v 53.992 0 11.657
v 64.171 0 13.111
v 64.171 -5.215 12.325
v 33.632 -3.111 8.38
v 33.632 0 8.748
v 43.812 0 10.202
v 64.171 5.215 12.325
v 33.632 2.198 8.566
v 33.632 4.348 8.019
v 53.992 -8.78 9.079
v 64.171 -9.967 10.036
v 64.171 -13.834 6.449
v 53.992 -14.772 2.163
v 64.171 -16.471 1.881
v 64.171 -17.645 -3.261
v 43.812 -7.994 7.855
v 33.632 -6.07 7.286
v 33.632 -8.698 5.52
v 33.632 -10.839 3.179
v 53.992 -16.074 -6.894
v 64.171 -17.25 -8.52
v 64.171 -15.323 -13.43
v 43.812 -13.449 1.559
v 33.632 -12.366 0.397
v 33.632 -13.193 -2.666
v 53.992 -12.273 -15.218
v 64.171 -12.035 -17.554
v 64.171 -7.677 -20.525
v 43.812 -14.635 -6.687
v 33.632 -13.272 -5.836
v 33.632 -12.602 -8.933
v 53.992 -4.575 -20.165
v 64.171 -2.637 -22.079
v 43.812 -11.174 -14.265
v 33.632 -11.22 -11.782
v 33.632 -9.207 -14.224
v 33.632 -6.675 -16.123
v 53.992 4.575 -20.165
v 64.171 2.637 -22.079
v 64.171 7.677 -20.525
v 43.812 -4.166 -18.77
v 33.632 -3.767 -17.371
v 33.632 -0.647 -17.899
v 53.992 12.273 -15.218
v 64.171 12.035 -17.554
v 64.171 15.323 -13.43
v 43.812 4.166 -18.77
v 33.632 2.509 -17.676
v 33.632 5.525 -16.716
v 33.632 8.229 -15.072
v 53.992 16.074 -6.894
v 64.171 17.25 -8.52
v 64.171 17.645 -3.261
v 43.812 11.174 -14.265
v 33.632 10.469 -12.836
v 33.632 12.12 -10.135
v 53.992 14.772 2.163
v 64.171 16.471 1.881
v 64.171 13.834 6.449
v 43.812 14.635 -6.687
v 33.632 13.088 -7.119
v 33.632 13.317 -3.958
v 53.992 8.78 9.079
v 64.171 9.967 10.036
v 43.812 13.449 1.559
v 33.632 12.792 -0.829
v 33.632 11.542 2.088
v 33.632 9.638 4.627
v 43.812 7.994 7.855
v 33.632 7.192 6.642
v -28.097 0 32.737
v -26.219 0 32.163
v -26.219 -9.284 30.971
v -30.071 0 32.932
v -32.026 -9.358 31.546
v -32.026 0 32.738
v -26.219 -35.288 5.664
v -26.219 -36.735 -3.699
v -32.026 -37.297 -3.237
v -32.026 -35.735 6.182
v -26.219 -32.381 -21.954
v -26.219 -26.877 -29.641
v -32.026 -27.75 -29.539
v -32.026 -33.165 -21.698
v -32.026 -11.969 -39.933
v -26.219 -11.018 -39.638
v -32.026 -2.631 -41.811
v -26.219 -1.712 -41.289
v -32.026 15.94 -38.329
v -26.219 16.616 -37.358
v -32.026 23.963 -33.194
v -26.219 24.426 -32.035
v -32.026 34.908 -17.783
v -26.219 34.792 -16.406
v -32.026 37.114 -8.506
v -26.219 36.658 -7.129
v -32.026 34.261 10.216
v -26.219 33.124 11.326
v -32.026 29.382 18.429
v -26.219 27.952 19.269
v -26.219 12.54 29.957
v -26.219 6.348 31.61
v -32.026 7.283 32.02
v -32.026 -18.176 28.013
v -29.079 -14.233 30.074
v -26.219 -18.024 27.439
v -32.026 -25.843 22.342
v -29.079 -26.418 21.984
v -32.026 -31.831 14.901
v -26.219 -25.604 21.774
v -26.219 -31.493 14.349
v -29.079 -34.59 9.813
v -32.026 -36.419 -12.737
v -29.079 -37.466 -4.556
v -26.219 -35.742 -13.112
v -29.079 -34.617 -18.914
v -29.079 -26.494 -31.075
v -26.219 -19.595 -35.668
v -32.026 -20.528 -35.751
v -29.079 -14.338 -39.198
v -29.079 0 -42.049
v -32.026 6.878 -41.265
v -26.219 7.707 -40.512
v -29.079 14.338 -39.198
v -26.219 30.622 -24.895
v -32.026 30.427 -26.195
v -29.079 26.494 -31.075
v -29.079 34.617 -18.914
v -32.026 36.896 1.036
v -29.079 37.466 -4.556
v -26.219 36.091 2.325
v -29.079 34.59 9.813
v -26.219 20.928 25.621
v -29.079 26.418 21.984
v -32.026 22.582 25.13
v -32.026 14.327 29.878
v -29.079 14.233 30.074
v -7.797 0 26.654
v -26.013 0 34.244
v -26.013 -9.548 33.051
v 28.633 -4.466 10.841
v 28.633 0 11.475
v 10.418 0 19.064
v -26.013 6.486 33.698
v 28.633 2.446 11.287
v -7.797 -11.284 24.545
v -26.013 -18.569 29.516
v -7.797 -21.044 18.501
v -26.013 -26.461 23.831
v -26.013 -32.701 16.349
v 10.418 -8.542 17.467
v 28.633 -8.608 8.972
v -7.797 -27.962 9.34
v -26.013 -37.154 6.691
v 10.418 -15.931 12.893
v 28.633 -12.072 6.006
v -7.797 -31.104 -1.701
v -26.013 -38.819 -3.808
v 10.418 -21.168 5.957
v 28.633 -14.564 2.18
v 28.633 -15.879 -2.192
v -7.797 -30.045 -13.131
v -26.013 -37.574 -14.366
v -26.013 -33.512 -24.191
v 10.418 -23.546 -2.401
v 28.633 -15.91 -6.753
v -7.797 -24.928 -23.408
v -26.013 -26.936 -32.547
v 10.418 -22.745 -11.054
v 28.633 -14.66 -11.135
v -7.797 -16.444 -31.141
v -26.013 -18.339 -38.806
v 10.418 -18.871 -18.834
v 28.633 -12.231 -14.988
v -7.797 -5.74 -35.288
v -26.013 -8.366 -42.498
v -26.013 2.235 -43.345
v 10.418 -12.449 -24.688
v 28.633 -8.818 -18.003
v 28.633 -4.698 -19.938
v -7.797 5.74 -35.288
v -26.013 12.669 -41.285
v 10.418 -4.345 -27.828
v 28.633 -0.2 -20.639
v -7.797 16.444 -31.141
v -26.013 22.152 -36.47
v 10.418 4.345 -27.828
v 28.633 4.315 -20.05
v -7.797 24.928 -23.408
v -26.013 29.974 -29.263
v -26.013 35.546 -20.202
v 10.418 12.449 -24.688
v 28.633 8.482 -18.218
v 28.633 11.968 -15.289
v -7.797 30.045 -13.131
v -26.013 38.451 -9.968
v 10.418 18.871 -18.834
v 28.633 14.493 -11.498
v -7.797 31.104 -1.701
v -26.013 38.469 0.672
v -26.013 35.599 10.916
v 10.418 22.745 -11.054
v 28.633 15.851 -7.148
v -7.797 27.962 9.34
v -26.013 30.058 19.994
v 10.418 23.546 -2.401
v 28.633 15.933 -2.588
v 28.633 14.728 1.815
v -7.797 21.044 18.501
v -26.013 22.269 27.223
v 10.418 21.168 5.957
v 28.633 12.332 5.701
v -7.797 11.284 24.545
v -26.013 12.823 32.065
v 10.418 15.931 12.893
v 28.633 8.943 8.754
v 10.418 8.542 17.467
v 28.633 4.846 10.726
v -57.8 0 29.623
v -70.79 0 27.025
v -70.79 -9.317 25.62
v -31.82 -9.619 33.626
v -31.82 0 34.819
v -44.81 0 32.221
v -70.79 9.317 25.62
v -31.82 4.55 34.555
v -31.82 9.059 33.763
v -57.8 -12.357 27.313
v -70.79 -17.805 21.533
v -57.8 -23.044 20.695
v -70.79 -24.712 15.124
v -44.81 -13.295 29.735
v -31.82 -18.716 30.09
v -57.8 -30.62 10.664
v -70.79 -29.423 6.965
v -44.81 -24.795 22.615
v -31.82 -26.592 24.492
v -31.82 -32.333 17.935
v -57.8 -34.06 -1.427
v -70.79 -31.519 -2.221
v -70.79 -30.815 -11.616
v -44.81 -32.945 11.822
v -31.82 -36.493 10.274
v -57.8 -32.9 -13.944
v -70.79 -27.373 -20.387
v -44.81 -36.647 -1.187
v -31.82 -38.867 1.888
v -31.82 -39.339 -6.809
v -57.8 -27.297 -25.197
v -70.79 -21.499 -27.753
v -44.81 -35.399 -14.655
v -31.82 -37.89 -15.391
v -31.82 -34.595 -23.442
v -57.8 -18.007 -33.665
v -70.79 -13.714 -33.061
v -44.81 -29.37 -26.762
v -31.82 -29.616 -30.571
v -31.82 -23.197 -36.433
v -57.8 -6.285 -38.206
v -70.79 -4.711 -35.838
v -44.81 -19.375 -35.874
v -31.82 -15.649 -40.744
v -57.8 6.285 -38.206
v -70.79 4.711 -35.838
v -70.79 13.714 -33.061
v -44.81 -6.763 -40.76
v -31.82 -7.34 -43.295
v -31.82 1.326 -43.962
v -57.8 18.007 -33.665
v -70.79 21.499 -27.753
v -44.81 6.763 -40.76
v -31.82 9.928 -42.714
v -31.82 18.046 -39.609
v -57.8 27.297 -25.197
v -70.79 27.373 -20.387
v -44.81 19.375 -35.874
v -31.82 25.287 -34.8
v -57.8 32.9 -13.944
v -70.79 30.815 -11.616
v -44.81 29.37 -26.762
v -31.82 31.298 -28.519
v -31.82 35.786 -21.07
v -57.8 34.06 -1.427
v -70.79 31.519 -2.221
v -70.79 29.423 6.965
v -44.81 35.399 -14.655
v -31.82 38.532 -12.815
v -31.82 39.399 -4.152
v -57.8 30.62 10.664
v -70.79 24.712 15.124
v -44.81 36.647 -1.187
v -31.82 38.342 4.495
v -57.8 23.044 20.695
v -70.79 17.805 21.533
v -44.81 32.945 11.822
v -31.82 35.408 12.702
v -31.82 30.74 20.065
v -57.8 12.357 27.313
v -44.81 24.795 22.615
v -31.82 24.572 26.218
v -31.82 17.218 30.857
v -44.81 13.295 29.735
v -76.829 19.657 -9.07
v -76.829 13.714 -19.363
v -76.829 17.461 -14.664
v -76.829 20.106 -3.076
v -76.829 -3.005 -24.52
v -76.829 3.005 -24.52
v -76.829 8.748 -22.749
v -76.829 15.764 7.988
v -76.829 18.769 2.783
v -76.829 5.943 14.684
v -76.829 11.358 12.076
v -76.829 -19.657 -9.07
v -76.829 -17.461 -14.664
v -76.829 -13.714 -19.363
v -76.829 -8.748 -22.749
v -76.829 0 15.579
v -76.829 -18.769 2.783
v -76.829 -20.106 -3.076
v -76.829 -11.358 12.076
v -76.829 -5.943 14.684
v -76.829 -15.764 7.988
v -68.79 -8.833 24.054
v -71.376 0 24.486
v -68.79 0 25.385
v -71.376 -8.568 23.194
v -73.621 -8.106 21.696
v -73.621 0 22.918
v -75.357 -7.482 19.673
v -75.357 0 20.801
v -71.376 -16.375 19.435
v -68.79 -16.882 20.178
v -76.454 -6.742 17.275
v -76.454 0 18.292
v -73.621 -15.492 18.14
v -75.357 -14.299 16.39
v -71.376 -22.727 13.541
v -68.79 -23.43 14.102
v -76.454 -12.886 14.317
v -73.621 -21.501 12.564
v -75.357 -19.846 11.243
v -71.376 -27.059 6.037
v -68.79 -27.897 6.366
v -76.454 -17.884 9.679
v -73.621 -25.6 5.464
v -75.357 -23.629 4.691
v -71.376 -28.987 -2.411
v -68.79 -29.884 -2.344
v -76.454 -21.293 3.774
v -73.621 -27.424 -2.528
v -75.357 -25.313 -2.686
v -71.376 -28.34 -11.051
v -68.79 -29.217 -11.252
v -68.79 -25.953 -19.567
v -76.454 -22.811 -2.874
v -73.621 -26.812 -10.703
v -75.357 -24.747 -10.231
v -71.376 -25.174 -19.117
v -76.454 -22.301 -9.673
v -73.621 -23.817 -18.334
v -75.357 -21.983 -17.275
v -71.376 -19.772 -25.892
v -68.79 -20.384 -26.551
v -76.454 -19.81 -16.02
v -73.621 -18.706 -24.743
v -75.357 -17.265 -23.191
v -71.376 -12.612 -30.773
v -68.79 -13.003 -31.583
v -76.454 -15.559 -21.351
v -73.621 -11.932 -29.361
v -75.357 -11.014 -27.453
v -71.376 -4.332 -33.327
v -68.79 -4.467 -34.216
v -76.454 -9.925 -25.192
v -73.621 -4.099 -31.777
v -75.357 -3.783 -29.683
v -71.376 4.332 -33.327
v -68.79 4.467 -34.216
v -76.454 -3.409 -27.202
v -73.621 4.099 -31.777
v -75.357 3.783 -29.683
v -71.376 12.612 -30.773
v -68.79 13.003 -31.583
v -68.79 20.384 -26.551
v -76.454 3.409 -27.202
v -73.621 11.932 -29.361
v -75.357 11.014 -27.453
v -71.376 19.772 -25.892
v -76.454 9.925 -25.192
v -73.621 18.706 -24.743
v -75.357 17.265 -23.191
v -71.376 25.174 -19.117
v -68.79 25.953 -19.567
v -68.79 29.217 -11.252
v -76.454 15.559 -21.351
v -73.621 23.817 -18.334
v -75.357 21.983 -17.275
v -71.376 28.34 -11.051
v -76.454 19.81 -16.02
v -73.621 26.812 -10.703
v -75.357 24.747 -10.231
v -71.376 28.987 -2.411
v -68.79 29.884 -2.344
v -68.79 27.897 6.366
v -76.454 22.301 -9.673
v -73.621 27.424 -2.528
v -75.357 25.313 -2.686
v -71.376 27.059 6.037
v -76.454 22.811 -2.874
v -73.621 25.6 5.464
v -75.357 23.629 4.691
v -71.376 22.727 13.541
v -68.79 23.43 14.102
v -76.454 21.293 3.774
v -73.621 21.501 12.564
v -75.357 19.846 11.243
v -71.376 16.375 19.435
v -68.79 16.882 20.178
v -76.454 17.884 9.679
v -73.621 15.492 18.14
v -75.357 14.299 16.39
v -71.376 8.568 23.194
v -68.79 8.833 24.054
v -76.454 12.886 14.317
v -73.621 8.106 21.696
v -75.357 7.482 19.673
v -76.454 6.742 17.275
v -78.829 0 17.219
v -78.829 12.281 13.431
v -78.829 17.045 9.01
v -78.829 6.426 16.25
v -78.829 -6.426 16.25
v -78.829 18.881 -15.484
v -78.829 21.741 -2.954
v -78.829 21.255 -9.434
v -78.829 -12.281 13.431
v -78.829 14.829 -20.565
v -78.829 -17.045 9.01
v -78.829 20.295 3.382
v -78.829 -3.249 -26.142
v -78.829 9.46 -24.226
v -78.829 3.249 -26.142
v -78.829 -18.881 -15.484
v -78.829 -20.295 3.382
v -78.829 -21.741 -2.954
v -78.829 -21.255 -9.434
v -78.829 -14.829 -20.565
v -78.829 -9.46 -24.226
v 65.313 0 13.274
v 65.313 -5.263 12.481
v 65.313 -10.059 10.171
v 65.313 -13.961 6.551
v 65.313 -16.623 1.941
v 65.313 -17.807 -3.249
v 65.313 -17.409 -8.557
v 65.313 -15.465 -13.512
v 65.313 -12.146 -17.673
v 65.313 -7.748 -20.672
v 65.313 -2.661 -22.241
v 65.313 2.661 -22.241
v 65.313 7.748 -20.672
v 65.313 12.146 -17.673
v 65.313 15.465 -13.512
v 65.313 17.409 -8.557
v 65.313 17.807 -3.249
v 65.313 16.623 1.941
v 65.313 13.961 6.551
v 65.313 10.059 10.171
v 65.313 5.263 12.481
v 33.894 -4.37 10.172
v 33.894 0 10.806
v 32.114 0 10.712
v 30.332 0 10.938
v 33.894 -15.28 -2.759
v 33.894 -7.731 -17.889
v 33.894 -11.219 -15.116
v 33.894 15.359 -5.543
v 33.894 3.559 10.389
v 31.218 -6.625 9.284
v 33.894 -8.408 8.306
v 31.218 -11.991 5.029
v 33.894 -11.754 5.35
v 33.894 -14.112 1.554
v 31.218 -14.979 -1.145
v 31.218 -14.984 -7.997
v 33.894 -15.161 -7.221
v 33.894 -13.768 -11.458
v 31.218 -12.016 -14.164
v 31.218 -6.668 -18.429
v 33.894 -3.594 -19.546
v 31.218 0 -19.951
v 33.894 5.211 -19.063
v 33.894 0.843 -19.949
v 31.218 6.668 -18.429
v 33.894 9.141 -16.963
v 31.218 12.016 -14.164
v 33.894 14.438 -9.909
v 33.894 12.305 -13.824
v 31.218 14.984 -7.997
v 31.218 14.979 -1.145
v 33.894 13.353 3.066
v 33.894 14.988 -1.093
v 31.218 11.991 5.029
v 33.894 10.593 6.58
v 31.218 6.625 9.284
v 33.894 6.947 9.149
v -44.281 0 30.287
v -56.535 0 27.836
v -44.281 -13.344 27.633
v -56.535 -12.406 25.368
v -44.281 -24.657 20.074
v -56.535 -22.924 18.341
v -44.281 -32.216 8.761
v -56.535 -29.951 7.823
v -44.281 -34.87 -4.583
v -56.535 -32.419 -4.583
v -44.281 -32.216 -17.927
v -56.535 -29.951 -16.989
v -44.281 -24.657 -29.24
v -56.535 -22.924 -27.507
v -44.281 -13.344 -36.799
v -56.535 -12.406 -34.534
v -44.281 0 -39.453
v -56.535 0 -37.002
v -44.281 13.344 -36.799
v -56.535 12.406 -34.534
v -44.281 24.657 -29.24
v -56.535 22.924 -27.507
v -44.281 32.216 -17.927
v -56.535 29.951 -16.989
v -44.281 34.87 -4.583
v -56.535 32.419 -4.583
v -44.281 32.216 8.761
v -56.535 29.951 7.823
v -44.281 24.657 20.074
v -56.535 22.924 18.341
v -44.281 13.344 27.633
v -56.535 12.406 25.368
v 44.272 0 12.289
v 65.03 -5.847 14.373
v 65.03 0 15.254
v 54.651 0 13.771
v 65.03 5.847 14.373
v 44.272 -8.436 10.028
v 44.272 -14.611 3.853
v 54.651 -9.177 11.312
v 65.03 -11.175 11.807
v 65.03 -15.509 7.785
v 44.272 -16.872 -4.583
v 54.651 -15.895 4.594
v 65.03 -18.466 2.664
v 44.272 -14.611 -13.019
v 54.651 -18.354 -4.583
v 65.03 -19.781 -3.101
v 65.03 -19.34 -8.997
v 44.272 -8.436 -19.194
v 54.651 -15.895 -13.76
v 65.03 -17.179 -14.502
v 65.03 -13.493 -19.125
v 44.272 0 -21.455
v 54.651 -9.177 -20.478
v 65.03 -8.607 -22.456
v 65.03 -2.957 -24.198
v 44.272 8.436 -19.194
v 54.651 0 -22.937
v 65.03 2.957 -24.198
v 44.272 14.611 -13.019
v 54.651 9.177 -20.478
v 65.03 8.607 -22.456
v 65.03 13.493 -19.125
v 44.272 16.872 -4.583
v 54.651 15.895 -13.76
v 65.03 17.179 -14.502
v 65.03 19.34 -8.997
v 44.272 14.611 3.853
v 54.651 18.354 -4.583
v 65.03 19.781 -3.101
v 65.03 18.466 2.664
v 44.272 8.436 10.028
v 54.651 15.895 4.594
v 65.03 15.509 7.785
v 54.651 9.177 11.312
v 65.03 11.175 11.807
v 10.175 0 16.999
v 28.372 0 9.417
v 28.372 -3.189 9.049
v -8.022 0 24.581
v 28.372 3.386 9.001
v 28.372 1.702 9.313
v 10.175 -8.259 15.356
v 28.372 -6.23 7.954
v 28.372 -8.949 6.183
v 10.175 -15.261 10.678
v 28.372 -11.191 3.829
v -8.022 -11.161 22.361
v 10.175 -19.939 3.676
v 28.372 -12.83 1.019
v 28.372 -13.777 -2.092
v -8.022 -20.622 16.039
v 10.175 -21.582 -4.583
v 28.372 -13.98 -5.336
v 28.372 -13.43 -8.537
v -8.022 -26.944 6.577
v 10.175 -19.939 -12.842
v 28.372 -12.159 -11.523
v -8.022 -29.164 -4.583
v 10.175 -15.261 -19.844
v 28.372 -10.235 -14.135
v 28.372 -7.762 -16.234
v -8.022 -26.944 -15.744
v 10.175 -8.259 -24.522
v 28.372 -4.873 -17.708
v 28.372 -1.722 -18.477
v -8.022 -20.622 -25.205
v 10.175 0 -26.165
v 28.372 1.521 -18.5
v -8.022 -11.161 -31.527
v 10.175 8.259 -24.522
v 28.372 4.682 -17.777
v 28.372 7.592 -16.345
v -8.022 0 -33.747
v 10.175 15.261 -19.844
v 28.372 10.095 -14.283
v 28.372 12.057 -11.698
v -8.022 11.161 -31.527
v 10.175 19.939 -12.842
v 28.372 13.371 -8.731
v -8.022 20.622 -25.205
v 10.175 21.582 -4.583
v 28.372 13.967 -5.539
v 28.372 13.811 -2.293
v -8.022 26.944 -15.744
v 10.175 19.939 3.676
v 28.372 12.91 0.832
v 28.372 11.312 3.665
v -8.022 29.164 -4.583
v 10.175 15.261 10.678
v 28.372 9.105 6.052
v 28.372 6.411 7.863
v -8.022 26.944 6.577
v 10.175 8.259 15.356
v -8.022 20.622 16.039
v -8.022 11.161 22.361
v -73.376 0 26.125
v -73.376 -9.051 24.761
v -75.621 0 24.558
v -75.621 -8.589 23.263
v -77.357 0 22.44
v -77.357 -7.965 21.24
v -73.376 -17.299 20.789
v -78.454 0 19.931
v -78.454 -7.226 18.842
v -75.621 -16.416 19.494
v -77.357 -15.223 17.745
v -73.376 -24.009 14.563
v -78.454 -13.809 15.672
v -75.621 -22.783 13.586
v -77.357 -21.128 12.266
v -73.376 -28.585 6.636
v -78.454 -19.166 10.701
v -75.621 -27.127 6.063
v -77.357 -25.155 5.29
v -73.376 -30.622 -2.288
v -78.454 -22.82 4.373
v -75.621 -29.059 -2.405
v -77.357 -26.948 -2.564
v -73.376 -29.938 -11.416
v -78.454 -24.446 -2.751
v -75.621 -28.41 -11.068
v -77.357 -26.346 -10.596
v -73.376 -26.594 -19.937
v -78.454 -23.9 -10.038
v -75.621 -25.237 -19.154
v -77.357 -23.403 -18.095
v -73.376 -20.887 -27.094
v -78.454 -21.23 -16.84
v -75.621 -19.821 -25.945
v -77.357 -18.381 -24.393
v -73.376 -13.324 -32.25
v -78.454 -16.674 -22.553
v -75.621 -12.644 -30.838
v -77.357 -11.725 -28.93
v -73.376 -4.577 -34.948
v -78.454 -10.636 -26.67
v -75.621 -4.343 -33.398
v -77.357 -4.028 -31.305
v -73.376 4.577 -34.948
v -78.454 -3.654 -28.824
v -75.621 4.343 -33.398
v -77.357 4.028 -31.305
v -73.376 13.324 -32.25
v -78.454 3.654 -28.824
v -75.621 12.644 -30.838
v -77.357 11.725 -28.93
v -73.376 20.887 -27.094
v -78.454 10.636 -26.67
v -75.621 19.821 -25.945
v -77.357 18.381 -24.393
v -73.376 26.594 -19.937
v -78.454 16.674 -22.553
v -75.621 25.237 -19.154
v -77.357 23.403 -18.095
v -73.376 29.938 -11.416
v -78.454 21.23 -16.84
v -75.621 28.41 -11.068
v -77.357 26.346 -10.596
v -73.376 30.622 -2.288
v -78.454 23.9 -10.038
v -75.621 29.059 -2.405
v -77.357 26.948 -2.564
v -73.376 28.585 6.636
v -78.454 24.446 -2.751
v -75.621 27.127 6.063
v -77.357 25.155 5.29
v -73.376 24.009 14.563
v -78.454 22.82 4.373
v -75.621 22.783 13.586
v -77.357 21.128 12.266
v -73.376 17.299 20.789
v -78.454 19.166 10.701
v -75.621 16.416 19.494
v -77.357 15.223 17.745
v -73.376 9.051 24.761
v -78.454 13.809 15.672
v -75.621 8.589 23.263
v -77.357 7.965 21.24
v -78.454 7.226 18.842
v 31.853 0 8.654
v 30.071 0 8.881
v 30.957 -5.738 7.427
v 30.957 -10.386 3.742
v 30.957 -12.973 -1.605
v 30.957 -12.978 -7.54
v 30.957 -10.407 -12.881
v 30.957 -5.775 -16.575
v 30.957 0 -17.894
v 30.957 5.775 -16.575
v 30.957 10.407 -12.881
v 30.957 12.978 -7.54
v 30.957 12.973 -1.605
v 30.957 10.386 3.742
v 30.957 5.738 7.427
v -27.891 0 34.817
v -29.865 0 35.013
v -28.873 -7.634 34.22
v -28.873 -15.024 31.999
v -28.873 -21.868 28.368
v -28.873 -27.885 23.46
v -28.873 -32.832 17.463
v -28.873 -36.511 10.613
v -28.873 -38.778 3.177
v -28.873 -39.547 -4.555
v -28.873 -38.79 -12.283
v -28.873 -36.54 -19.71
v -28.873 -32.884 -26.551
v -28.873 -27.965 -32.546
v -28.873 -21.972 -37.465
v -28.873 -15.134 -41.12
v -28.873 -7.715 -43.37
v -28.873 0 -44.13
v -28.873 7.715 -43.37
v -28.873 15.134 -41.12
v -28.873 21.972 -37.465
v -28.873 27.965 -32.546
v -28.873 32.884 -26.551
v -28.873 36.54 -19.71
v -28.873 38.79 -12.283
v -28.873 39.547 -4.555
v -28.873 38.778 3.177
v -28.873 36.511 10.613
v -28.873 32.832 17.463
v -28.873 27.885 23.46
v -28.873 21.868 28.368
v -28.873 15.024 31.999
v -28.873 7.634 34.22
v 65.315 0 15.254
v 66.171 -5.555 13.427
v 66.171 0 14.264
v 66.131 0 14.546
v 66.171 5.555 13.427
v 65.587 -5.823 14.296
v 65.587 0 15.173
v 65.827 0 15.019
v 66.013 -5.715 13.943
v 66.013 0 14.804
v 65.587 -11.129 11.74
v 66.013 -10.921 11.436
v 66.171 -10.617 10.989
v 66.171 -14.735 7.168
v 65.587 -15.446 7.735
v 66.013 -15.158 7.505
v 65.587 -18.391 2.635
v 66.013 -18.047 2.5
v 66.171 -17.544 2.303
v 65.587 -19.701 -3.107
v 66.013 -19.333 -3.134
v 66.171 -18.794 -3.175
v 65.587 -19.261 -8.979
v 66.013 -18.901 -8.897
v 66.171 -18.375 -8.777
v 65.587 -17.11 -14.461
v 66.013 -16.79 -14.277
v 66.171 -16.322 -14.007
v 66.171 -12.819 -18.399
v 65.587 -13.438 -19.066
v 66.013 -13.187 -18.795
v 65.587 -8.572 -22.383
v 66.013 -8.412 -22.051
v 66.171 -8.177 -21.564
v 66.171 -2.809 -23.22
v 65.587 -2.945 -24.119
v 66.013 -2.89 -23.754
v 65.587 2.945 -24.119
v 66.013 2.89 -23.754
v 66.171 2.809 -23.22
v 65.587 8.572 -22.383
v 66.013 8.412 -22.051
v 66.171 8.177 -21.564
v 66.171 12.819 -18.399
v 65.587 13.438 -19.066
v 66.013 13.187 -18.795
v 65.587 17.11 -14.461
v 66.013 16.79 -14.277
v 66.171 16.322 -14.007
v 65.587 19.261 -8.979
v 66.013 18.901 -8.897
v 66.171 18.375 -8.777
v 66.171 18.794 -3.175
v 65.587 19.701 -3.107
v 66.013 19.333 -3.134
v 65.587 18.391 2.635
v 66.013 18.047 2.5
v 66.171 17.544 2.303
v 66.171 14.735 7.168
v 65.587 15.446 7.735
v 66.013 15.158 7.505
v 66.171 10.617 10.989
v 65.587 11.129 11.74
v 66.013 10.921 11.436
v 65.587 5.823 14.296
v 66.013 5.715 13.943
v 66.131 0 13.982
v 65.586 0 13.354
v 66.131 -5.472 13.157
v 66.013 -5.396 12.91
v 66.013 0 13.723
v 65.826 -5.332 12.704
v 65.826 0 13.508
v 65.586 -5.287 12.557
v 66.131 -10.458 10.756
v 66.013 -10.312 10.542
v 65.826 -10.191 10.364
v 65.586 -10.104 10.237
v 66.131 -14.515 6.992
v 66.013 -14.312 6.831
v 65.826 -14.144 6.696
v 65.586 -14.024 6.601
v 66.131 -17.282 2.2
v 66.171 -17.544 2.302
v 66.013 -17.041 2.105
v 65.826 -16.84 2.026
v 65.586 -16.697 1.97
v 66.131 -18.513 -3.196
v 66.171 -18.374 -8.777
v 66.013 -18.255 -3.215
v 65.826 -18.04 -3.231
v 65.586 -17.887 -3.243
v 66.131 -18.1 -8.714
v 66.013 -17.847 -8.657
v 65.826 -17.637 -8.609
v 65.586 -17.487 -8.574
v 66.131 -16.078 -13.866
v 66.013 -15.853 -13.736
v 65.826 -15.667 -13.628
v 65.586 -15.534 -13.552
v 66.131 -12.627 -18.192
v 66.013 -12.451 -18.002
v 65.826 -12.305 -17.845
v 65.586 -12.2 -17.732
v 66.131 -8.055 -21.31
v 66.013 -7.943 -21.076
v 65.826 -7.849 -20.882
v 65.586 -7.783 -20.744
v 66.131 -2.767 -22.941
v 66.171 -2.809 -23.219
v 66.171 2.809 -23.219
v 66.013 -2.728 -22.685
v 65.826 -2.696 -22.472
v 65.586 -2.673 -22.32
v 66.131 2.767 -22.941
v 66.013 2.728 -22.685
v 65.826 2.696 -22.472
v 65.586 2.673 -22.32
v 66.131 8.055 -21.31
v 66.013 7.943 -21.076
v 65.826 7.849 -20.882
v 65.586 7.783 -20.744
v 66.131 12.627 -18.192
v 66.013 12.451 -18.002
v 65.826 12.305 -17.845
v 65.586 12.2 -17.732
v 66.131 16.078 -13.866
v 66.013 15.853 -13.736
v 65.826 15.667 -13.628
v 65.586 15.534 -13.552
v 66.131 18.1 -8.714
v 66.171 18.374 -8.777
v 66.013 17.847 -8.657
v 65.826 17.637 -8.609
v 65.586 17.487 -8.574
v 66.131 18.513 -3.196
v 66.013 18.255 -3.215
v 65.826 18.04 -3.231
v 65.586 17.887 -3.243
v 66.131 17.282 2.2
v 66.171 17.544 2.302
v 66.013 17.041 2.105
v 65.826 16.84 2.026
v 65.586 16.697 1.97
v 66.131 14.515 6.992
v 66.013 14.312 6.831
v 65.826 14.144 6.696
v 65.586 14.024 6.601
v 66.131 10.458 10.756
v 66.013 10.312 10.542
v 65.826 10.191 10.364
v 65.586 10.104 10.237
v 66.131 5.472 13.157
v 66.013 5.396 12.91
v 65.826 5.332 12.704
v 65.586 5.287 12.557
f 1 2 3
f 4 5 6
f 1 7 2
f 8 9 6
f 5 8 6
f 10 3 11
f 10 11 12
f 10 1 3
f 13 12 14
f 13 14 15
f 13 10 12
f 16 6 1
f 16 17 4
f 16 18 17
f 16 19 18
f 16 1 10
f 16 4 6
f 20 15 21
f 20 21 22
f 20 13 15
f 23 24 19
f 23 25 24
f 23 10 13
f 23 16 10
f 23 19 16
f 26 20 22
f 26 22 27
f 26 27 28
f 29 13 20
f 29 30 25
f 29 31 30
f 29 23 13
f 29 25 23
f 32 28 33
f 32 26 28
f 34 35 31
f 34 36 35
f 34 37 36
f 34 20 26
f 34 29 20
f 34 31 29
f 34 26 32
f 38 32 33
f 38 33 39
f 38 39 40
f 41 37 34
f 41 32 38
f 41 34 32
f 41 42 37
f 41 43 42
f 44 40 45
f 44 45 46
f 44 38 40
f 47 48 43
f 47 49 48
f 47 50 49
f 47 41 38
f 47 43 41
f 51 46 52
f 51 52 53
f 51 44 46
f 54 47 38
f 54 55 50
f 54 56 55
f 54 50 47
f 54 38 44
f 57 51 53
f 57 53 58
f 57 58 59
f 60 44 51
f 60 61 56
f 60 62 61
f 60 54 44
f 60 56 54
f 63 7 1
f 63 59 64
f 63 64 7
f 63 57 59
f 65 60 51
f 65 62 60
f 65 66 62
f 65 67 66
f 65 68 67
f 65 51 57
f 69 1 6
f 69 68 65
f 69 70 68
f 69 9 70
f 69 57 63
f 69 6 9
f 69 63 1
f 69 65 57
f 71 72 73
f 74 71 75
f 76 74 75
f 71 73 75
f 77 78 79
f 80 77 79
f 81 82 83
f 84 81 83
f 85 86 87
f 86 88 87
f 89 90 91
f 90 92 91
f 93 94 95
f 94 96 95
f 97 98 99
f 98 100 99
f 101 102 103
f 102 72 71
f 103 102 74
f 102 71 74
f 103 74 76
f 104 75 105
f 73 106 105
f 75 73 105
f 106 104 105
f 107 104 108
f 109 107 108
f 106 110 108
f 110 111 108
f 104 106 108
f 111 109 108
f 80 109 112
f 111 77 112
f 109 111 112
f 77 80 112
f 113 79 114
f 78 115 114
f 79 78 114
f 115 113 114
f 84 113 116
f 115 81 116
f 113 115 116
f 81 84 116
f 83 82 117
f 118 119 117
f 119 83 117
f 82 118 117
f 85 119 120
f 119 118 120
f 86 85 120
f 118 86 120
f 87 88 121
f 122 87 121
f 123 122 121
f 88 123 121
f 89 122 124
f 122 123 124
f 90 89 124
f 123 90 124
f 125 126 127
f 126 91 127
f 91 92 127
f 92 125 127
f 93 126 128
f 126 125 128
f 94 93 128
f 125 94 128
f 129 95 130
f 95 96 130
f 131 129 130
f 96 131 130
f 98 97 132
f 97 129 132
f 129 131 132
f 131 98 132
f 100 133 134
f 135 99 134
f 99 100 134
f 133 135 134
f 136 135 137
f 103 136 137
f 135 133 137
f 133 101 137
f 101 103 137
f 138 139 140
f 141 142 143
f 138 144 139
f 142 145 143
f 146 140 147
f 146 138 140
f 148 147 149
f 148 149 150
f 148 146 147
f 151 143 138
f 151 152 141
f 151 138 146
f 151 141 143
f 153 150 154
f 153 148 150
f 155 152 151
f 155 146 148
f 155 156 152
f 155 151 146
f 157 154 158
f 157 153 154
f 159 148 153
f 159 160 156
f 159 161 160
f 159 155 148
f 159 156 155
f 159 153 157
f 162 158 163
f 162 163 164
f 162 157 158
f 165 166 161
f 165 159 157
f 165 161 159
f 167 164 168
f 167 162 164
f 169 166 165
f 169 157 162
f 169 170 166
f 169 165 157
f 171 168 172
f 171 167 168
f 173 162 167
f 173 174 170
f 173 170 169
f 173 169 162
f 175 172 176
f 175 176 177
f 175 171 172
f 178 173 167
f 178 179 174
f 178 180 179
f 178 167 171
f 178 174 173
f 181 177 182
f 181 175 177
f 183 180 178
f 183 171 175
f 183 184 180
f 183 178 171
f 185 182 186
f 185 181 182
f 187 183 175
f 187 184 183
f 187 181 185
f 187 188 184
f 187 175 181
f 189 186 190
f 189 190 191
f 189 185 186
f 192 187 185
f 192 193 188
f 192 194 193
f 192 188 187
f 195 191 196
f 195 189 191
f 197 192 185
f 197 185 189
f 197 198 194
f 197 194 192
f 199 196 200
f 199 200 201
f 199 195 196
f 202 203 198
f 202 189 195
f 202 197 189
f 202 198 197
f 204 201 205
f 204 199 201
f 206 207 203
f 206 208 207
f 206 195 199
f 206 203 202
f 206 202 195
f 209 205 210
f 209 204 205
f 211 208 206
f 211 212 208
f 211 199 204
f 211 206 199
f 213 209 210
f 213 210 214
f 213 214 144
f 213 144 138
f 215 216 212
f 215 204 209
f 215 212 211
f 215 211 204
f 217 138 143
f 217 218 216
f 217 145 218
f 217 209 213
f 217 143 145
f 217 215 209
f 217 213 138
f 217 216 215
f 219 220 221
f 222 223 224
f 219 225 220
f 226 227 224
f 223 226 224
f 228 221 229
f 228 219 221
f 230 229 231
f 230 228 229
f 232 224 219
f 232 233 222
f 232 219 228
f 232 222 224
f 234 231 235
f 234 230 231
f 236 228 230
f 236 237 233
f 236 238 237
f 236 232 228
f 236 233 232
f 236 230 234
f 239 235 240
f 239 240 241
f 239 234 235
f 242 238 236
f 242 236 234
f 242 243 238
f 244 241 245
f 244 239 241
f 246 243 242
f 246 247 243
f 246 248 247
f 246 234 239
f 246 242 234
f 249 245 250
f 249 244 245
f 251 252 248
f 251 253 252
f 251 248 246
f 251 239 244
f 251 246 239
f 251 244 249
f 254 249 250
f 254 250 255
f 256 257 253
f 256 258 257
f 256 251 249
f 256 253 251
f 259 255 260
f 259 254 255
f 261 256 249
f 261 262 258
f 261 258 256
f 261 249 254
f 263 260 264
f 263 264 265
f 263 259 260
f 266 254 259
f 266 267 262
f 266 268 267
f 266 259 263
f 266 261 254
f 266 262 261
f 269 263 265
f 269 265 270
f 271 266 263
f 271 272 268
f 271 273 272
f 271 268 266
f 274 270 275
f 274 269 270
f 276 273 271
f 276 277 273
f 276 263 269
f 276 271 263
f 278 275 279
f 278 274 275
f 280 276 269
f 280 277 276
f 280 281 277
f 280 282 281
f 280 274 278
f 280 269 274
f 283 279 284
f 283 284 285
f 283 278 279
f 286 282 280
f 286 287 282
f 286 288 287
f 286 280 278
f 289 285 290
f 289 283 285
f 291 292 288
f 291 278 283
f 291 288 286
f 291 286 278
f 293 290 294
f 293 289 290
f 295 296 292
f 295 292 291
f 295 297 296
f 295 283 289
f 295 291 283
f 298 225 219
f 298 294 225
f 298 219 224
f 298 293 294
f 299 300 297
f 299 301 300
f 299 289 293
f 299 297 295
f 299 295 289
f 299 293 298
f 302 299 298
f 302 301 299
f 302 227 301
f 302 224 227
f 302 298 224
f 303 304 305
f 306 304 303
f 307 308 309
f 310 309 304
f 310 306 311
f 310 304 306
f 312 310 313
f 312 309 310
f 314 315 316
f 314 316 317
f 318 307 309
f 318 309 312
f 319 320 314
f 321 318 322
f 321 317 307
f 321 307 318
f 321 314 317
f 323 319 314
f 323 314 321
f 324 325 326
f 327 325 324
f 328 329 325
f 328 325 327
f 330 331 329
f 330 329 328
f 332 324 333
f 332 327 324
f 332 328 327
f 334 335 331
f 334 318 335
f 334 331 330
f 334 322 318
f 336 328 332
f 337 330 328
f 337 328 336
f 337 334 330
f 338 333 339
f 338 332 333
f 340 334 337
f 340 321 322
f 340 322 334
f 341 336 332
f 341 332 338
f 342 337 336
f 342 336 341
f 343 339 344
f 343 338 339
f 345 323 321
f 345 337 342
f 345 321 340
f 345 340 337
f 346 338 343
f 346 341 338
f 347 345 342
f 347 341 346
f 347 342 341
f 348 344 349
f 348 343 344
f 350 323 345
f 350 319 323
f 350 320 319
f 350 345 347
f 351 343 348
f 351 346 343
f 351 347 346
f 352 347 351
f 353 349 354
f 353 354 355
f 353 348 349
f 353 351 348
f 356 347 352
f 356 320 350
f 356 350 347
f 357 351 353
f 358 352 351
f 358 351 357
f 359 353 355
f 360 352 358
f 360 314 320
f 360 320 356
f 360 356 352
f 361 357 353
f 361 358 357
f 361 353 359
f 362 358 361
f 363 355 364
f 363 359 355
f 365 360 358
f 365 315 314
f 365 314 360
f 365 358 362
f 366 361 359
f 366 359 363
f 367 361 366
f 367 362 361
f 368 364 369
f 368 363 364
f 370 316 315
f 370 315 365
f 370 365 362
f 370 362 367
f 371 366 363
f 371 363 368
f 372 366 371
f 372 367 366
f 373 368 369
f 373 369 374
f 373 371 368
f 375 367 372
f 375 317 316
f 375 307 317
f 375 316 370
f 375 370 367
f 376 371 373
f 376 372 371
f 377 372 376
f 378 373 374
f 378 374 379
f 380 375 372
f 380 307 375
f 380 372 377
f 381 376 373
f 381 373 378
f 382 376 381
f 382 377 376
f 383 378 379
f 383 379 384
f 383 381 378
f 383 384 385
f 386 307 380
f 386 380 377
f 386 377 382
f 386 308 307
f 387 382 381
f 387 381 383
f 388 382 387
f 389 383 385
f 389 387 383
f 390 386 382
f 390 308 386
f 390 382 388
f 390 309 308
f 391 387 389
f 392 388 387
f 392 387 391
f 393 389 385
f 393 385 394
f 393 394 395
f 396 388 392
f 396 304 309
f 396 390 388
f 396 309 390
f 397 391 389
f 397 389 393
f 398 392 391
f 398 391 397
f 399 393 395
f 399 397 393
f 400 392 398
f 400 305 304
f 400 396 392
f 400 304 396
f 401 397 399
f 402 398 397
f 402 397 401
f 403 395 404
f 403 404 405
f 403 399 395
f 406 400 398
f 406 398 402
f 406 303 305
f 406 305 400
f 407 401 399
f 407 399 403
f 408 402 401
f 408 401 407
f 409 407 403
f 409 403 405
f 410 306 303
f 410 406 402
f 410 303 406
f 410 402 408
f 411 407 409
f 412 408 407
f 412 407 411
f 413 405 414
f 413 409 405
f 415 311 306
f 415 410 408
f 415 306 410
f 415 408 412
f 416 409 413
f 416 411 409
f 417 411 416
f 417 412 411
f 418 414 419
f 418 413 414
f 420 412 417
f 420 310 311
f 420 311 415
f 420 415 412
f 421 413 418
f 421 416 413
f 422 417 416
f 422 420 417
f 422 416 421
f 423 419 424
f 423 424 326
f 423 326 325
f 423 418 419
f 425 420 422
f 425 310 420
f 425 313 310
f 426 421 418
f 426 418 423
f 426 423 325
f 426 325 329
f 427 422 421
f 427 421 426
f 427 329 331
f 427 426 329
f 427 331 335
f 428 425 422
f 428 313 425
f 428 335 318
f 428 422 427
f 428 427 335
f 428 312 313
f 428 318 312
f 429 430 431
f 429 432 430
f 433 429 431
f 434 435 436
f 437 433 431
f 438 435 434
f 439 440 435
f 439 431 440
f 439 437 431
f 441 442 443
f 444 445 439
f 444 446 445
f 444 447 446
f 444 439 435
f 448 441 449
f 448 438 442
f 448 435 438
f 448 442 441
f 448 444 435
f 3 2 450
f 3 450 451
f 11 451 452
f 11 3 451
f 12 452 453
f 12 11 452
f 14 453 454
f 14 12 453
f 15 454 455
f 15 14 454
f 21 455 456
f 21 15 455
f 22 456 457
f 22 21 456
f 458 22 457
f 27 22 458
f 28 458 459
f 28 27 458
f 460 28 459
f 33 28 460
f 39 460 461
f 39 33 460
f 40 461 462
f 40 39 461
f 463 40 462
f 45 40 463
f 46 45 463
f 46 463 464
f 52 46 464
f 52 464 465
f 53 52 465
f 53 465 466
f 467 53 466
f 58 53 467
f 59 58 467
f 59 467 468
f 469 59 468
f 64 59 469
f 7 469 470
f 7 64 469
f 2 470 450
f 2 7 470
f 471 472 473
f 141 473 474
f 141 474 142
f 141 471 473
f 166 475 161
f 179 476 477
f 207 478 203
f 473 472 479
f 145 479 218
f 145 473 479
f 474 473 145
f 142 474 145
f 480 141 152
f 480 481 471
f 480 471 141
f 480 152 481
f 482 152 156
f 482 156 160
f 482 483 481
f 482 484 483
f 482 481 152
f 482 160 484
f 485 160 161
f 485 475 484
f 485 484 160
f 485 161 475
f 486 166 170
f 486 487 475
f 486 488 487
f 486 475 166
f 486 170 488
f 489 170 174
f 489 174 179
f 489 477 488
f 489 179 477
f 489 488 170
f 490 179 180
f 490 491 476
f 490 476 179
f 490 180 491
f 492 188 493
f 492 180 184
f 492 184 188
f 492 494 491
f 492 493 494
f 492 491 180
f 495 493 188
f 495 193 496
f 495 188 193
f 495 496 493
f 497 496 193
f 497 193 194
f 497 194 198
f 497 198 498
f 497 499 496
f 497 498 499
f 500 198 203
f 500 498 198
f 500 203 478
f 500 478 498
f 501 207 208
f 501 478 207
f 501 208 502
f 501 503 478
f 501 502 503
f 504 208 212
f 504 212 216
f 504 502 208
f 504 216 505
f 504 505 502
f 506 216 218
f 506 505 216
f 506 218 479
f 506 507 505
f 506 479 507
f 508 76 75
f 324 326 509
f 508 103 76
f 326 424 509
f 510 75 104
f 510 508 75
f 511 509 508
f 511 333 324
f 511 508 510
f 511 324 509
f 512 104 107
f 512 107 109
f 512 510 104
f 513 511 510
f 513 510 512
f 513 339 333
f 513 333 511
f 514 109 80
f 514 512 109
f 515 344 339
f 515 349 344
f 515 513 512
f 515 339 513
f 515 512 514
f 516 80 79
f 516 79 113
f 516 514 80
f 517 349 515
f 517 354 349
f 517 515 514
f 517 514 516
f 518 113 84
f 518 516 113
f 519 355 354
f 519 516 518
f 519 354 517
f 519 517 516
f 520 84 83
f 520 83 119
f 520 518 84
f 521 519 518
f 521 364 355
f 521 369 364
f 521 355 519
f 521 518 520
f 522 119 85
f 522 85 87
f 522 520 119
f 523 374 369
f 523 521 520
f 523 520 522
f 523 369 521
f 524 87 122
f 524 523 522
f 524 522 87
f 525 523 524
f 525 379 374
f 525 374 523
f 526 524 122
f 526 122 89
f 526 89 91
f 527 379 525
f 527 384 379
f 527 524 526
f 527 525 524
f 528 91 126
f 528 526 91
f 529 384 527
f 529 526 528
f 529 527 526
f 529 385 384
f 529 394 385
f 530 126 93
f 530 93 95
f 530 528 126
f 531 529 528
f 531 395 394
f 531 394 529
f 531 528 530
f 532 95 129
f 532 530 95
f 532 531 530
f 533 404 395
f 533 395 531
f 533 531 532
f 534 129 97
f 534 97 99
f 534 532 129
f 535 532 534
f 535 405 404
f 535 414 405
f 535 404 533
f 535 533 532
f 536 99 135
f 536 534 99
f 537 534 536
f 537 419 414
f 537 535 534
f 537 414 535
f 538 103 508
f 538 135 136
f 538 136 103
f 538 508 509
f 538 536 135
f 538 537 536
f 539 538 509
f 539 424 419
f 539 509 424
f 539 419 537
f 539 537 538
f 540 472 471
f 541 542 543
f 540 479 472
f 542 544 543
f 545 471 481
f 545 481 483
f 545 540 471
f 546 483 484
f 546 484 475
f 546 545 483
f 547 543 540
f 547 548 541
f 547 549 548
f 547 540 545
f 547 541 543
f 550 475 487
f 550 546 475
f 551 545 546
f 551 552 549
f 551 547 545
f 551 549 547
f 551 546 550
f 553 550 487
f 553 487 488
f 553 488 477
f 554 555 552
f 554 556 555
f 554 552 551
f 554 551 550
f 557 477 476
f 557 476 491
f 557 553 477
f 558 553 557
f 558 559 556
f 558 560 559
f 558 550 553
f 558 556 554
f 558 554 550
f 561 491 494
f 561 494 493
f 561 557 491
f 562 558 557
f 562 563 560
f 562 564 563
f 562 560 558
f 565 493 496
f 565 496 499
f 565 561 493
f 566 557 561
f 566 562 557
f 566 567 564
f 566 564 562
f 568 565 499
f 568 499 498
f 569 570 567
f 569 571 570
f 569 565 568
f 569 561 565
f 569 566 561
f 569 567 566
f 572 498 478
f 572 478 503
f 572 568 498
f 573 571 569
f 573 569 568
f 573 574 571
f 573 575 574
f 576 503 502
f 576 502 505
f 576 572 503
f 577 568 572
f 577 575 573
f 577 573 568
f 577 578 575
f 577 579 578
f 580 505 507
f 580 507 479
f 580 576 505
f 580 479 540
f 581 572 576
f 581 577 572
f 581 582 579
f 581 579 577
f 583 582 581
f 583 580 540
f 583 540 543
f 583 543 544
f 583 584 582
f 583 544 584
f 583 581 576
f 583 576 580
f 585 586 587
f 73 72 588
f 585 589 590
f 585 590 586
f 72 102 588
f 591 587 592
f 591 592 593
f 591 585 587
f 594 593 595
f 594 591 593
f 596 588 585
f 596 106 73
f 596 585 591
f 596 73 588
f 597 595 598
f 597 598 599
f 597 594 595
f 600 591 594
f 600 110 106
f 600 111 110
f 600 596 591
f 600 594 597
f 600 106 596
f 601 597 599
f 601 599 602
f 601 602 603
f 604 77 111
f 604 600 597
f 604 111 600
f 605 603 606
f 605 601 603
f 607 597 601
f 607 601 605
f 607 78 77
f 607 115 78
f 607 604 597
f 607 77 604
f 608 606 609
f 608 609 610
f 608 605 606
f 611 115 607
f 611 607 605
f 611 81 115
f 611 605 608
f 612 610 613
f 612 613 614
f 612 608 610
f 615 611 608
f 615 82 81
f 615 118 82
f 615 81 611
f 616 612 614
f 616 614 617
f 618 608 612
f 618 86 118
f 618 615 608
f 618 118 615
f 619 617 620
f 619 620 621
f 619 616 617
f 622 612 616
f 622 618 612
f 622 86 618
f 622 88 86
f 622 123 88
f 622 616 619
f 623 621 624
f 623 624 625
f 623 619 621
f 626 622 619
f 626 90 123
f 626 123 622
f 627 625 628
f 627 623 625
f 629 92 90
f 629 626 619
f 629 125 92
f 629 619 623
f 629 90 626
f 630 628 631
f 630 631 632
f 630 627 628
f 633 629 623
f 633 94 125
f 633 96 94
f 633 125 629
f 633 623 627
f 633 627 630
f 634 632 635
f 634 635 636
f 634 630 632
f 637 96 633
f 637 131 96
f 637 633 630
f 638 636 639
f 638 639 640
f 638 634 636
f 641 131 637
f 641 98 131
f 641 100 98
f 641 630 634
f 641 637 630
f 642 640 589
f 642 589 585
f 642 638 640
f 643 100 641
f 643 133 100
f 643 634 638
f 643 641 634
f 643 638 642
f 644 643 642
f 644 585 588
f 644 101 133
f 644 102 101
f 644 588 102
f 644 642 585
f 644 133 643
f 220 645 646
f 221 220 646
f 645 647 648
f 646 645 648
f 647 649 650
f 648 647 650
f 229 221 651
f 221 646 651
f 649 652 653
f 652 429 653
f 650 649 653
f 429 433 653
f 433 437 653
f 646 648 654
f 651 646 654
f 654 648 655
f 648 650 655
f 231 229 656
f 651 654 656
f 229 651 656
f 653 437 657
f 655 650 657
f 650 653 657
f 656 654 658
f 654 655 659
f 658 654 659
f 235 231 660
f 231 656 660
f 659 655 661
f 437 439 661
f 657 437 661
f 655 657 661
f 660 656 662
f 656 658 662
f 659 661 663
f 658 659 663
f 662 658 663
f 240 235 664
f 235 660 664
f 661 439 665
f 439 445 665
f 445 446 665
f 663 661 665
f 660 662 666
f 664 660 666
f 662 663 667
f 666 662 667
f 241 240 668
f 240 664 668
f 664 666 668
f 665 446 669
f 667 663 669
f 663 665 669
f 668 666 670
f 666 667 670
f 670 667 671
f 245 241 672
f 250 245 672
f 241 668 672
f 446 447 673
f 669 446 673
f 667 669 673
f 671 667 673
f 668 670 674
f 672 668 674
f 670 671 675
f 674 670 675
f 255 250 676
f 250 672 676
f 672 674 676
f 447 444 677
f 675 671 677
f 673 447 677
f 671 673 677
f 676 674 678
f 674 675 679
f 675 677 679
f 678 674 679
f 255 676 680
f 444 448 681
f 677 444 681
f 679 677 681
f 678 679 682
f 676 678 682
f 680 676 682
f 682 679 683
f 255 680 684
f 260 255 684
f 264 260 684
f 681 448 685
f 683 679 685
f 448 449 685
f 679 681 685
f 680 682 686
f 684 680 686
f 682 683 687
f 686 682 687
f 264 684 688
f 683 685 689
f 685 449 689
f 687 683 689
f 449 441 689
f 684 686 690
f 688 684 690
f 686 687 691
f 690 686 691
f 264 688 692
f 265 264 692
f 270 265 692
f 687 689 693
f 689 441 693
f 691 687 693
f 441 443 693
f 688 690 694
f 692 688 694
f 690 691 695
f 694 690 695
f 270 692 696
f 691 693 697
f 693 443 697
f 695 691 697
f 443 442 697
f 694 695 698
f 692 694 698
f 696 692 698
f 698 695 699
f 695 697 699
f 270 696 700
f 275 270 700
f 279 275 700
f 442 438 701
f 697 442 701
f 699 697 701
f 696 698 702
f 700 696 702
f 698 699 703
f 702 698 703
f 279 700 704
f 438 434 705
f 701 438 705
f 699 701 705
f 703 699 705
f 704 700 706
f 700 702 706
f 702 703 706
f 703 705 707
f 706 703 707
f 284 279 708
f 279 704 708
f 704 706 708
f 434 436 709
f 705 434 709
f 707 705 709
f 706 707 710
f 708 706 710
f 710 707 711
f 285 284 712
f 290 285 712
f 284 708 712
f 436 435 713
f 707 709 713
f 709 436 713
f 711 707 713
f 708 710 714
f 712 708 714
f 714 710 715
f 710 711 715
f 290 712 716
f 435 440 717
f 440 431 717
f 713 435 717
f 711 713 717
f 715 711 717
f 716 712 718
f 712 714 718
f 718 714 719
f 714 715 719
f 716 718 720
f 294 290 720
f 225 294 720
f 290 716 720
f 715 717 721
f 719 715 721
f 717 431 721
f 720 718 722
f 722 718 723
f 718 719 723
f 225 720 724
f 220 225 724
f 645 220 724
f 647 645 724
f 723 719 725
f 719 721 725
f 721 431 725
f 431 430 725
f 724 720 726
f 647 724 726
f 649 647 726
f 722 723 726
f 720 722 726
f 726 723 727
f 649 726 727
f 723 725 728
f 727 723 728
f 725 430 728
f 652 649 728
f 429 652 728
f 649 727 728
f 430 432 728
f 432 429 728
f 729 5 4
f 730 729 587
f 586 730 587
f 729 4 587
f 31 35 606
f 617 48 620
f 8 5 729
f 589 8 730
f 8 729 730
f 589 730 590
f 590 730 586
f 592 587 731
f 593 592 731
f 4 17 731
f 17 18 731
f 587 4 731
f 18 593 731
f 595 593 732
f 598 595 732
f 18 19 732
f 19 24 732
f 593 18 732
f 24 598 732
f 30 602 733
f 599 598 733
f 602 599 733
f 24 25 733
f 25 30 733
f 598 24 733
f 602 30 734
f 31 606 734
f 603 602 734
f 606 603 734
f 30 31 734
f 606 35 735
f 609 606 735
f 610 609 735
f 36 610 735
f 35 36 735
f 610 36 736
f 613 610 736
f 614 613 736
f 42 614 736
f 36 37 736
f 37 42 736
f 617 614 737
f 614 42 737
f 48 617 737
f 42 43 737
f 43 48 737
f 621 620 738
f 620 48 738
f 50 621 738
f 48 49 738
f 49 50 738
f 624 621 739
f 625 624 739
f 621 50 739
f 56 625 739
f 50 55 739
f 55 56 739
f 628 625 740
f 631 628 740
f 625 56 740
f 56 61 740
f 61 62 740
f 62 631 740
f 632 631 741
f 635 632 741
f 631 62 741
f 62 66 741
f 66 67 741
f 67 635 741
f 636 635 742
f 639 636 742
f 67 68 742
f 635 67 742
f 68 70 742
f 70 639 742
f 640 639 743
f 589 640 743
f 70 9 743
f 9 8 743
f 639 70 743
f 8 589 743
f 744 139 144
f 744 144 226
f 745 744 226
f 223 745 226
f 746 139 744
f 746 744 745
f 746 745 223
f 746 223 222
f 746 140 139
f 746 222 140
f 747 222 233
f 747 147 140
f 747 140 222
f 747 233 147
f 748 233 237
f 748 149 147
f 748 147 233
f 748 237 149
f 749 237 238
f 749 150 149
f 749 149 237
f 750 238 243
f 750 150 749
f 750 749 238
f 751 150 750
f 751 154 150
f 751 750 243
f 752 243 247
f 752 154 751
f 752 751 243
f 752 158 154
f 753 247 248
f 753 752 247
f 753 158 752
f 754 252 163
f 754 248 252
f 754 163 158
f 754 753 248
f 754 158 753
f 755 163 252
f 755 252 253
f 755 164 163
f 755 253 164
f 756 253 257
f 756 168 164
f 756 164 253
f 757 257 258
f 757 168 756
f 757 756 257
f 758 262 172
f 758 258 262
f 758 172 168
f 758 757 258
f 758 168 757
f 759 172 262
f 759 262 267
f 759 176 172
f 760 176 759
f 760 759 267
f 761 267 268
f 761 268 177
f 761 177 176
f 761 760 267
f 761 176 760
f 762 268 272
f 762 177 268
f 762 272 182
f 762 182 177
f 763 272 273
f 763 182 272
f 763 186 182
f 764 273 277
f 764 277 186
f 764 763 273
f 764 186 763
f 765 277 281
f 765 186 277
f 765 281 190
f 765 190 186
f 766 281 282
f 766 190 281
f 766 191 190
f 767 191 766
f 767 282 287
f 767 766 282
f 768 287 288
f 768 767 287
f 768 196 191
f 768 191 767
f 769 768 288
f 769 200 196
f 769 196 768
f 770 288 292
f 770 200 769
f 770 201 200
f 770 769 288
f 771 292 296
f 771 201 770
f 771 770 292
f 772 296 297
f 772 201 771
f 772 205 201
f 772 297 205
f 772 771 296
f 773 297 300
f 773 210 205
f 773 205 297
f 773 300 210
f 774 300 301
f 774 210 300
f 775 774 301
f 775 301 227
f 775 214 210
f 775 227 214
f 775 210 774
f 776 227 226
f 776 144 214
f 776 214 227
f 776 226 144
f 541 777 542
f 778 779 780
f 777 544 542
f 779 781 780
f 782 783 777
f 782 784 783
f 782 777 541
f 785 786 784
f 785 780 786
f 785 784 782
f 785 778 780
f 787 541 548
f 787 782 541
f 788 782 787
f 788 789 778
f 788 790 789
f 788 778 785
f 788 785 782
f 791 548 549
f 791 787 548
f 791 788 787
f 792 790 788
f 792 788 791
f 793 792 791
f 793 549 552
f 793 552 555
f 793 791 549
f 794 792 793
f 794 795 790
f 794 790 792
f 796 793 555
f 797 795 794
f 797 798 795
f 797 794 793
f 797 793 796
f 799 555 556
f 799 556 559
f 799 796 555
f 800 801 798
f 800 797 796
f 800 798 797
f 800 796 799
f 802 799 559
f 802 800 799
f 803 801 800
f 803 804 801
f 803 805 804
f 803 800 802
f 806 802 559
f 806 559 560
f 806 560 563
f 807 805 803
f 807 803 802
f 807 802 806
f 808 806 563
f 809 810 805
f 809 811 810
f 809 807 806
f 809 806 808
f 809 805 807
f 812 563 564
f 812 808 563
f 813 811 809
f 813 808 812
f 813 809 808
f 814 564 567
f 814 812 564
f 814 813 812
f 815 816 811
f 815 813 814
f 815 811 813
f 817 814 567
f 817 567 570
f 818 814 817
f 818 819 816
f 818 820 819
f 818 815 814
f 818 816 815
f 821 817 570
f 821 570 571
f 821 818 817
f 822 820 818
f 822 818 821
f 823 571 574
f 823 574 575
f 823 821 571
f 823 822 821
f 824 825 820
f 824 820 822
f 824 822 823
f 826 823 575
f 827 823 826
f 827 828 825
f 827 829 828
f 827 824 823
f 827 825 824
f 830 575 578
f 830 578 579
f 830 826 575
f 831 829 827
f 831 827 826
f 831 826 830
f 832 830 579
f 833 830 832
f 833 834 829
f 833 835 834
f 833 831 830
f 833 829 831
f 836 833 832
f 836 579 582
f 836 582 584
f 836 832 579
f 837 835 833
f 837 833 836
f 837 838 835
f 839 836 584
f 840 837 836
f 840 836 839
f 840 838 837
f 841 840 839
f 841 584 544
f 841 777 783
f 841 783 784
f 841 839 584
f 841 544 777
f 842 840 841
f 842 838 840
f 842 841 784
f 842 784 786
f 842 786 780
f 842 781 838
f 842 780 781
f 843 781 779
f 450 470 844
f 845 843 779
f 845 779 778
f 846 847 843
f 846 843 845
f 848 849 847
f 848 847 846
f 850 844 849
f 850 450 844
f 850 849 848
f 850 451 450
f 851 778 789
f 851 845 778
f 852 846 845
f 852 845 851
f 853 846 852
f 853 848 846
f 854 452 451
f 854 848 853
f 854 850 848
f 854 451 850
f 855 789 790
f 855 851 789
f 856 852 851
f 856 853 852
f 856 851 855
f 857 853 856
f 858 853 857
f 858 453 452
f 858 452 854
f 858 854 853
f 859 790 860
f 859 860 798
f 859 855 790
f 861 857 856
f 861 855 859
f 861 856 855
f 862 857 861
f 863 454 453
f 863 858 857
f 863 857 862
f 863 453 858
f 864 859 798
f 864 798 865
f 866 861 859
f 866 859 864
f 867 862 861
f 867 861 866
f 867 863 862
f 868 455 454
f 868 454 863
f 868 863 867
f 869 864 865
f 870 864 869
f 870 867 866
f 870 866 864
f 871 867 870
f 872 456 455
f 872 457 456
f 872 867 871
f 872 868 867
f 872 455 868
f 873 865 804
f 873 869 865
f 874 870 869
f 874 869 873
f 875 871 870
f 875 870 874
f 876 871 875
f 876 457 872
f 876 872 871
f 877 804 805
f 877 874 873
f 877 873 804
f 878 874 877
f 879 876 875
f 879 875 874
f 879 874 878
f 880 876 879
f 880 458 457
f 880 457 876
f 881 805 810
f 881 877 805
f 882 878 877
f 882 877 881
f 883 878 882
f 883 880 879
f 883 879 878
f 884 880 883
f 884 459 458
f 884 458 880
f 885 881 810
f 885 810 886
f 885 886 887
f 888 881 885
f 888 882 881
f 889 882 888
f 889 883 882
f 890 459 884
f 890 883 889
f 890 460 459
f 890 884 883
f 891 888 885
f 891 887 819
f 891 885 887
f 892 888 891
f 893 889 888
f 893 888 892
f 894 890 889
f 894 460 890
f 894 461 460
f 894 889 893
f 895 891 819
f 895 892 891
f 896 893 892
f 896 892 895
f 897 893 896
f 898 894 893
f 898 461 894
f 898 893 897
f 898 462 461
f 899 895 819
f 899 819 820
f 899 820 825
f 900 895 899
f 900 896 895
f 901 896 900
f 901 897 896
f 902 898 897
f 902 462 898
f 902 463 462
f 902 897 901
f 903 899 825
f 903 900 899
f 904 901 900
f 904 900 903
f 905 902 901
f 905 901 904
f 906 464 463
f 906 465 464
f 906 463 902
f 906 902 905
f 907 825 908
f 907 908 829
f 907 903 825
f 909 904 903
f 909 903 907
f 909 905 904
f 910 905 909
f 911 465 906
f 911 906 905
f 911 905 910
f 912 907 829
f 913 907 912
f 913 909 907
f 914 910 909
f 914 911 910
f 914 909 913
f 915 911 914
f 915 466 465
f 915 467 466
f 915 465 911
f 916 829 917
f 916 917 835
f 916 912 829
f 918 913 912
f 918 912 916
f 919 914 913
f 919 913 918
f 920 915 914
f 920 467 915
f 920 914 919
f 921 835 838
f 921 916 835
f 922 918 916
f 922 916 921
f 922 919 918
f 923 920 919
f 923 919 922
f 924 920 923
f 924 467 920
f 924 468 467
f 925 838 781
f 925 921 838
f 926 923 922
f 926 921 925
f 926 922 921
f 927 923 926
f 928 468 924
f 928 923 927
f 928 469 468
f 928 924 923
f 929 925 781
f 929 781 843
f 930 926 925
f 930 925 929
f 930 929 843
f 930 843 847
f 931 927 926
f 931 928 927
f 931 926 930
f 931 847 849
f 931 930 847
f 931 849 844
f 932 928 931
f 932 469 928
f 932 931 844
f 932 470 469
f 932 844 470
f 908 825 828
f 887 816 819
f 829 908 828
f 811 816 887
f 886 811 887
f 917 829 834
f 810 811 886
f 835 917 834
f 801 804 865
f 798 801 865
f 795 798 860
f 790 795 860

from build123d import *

# Parameters (mm, degrees)
FILLET_1_R = 1
FILLET_4_R = 10


with BuildPart() as part:
    # 스케치2 → 회전5 (revolve)
    with BuildSketch(Plane(origin=(0, 0, 0), x_dir=(1, 0, 0), z_dir=(0, 1, 0)), mode=Mode.PRIVATE) as revolve_5_sk:
        Polygon((-78.828533155, 4.583054253), (-78.828533155, 34.583054253), (-28.828533155, 44.583054253), (31.171466845, 19.583054253), (66.171466845, 24.583054253), (66.171466845, 22.562749164), (64.171466845, 22.277034878), (30.909884451, 17.525380251), (-29.034574551, 42.502238168), (-76.828533155, 32.943446448), (-76.828533155, 4.583054253), align=None)
    revolve(revolve_5_sk.sketch.rotate(Axis((-92.184862693, 0, -4.583054253), (1, 0, 0)), 180), axis=Axis((-92.184862693, 0, -4.583054253), (1, 0, 0)))

    # 필렛1
    fillet_1_edges = [part.edges().sort_by_distance(p)[0] for p in [
        (66.171466845, 0, -22.562749164),
        (66.171466845, 0, -24.583054253),
    ]]
    fillet(fillet_1_edges, radius=FILLET_1_R - 0.0001)  # a hair under: the kernel refuses the full size

    # 필렛4
    fillet_4_edges = [part.edges().sort_by_distance(p)[0] for p in [
        (-76.828533155, 0, -32.943446448),
        (-29.034574551, 0, -42.502238168),
        (30.909884451, 0, -17.525380251),
        (31.171466845, 0, -19.583054253),
        (-28.828533155, 0, -44.583054253),
        (-78.828533155, 0, -34.583054253),
    ]]
    fillet(fillet_4_edges, radius=FILLET_4_R)


solid = part.part
